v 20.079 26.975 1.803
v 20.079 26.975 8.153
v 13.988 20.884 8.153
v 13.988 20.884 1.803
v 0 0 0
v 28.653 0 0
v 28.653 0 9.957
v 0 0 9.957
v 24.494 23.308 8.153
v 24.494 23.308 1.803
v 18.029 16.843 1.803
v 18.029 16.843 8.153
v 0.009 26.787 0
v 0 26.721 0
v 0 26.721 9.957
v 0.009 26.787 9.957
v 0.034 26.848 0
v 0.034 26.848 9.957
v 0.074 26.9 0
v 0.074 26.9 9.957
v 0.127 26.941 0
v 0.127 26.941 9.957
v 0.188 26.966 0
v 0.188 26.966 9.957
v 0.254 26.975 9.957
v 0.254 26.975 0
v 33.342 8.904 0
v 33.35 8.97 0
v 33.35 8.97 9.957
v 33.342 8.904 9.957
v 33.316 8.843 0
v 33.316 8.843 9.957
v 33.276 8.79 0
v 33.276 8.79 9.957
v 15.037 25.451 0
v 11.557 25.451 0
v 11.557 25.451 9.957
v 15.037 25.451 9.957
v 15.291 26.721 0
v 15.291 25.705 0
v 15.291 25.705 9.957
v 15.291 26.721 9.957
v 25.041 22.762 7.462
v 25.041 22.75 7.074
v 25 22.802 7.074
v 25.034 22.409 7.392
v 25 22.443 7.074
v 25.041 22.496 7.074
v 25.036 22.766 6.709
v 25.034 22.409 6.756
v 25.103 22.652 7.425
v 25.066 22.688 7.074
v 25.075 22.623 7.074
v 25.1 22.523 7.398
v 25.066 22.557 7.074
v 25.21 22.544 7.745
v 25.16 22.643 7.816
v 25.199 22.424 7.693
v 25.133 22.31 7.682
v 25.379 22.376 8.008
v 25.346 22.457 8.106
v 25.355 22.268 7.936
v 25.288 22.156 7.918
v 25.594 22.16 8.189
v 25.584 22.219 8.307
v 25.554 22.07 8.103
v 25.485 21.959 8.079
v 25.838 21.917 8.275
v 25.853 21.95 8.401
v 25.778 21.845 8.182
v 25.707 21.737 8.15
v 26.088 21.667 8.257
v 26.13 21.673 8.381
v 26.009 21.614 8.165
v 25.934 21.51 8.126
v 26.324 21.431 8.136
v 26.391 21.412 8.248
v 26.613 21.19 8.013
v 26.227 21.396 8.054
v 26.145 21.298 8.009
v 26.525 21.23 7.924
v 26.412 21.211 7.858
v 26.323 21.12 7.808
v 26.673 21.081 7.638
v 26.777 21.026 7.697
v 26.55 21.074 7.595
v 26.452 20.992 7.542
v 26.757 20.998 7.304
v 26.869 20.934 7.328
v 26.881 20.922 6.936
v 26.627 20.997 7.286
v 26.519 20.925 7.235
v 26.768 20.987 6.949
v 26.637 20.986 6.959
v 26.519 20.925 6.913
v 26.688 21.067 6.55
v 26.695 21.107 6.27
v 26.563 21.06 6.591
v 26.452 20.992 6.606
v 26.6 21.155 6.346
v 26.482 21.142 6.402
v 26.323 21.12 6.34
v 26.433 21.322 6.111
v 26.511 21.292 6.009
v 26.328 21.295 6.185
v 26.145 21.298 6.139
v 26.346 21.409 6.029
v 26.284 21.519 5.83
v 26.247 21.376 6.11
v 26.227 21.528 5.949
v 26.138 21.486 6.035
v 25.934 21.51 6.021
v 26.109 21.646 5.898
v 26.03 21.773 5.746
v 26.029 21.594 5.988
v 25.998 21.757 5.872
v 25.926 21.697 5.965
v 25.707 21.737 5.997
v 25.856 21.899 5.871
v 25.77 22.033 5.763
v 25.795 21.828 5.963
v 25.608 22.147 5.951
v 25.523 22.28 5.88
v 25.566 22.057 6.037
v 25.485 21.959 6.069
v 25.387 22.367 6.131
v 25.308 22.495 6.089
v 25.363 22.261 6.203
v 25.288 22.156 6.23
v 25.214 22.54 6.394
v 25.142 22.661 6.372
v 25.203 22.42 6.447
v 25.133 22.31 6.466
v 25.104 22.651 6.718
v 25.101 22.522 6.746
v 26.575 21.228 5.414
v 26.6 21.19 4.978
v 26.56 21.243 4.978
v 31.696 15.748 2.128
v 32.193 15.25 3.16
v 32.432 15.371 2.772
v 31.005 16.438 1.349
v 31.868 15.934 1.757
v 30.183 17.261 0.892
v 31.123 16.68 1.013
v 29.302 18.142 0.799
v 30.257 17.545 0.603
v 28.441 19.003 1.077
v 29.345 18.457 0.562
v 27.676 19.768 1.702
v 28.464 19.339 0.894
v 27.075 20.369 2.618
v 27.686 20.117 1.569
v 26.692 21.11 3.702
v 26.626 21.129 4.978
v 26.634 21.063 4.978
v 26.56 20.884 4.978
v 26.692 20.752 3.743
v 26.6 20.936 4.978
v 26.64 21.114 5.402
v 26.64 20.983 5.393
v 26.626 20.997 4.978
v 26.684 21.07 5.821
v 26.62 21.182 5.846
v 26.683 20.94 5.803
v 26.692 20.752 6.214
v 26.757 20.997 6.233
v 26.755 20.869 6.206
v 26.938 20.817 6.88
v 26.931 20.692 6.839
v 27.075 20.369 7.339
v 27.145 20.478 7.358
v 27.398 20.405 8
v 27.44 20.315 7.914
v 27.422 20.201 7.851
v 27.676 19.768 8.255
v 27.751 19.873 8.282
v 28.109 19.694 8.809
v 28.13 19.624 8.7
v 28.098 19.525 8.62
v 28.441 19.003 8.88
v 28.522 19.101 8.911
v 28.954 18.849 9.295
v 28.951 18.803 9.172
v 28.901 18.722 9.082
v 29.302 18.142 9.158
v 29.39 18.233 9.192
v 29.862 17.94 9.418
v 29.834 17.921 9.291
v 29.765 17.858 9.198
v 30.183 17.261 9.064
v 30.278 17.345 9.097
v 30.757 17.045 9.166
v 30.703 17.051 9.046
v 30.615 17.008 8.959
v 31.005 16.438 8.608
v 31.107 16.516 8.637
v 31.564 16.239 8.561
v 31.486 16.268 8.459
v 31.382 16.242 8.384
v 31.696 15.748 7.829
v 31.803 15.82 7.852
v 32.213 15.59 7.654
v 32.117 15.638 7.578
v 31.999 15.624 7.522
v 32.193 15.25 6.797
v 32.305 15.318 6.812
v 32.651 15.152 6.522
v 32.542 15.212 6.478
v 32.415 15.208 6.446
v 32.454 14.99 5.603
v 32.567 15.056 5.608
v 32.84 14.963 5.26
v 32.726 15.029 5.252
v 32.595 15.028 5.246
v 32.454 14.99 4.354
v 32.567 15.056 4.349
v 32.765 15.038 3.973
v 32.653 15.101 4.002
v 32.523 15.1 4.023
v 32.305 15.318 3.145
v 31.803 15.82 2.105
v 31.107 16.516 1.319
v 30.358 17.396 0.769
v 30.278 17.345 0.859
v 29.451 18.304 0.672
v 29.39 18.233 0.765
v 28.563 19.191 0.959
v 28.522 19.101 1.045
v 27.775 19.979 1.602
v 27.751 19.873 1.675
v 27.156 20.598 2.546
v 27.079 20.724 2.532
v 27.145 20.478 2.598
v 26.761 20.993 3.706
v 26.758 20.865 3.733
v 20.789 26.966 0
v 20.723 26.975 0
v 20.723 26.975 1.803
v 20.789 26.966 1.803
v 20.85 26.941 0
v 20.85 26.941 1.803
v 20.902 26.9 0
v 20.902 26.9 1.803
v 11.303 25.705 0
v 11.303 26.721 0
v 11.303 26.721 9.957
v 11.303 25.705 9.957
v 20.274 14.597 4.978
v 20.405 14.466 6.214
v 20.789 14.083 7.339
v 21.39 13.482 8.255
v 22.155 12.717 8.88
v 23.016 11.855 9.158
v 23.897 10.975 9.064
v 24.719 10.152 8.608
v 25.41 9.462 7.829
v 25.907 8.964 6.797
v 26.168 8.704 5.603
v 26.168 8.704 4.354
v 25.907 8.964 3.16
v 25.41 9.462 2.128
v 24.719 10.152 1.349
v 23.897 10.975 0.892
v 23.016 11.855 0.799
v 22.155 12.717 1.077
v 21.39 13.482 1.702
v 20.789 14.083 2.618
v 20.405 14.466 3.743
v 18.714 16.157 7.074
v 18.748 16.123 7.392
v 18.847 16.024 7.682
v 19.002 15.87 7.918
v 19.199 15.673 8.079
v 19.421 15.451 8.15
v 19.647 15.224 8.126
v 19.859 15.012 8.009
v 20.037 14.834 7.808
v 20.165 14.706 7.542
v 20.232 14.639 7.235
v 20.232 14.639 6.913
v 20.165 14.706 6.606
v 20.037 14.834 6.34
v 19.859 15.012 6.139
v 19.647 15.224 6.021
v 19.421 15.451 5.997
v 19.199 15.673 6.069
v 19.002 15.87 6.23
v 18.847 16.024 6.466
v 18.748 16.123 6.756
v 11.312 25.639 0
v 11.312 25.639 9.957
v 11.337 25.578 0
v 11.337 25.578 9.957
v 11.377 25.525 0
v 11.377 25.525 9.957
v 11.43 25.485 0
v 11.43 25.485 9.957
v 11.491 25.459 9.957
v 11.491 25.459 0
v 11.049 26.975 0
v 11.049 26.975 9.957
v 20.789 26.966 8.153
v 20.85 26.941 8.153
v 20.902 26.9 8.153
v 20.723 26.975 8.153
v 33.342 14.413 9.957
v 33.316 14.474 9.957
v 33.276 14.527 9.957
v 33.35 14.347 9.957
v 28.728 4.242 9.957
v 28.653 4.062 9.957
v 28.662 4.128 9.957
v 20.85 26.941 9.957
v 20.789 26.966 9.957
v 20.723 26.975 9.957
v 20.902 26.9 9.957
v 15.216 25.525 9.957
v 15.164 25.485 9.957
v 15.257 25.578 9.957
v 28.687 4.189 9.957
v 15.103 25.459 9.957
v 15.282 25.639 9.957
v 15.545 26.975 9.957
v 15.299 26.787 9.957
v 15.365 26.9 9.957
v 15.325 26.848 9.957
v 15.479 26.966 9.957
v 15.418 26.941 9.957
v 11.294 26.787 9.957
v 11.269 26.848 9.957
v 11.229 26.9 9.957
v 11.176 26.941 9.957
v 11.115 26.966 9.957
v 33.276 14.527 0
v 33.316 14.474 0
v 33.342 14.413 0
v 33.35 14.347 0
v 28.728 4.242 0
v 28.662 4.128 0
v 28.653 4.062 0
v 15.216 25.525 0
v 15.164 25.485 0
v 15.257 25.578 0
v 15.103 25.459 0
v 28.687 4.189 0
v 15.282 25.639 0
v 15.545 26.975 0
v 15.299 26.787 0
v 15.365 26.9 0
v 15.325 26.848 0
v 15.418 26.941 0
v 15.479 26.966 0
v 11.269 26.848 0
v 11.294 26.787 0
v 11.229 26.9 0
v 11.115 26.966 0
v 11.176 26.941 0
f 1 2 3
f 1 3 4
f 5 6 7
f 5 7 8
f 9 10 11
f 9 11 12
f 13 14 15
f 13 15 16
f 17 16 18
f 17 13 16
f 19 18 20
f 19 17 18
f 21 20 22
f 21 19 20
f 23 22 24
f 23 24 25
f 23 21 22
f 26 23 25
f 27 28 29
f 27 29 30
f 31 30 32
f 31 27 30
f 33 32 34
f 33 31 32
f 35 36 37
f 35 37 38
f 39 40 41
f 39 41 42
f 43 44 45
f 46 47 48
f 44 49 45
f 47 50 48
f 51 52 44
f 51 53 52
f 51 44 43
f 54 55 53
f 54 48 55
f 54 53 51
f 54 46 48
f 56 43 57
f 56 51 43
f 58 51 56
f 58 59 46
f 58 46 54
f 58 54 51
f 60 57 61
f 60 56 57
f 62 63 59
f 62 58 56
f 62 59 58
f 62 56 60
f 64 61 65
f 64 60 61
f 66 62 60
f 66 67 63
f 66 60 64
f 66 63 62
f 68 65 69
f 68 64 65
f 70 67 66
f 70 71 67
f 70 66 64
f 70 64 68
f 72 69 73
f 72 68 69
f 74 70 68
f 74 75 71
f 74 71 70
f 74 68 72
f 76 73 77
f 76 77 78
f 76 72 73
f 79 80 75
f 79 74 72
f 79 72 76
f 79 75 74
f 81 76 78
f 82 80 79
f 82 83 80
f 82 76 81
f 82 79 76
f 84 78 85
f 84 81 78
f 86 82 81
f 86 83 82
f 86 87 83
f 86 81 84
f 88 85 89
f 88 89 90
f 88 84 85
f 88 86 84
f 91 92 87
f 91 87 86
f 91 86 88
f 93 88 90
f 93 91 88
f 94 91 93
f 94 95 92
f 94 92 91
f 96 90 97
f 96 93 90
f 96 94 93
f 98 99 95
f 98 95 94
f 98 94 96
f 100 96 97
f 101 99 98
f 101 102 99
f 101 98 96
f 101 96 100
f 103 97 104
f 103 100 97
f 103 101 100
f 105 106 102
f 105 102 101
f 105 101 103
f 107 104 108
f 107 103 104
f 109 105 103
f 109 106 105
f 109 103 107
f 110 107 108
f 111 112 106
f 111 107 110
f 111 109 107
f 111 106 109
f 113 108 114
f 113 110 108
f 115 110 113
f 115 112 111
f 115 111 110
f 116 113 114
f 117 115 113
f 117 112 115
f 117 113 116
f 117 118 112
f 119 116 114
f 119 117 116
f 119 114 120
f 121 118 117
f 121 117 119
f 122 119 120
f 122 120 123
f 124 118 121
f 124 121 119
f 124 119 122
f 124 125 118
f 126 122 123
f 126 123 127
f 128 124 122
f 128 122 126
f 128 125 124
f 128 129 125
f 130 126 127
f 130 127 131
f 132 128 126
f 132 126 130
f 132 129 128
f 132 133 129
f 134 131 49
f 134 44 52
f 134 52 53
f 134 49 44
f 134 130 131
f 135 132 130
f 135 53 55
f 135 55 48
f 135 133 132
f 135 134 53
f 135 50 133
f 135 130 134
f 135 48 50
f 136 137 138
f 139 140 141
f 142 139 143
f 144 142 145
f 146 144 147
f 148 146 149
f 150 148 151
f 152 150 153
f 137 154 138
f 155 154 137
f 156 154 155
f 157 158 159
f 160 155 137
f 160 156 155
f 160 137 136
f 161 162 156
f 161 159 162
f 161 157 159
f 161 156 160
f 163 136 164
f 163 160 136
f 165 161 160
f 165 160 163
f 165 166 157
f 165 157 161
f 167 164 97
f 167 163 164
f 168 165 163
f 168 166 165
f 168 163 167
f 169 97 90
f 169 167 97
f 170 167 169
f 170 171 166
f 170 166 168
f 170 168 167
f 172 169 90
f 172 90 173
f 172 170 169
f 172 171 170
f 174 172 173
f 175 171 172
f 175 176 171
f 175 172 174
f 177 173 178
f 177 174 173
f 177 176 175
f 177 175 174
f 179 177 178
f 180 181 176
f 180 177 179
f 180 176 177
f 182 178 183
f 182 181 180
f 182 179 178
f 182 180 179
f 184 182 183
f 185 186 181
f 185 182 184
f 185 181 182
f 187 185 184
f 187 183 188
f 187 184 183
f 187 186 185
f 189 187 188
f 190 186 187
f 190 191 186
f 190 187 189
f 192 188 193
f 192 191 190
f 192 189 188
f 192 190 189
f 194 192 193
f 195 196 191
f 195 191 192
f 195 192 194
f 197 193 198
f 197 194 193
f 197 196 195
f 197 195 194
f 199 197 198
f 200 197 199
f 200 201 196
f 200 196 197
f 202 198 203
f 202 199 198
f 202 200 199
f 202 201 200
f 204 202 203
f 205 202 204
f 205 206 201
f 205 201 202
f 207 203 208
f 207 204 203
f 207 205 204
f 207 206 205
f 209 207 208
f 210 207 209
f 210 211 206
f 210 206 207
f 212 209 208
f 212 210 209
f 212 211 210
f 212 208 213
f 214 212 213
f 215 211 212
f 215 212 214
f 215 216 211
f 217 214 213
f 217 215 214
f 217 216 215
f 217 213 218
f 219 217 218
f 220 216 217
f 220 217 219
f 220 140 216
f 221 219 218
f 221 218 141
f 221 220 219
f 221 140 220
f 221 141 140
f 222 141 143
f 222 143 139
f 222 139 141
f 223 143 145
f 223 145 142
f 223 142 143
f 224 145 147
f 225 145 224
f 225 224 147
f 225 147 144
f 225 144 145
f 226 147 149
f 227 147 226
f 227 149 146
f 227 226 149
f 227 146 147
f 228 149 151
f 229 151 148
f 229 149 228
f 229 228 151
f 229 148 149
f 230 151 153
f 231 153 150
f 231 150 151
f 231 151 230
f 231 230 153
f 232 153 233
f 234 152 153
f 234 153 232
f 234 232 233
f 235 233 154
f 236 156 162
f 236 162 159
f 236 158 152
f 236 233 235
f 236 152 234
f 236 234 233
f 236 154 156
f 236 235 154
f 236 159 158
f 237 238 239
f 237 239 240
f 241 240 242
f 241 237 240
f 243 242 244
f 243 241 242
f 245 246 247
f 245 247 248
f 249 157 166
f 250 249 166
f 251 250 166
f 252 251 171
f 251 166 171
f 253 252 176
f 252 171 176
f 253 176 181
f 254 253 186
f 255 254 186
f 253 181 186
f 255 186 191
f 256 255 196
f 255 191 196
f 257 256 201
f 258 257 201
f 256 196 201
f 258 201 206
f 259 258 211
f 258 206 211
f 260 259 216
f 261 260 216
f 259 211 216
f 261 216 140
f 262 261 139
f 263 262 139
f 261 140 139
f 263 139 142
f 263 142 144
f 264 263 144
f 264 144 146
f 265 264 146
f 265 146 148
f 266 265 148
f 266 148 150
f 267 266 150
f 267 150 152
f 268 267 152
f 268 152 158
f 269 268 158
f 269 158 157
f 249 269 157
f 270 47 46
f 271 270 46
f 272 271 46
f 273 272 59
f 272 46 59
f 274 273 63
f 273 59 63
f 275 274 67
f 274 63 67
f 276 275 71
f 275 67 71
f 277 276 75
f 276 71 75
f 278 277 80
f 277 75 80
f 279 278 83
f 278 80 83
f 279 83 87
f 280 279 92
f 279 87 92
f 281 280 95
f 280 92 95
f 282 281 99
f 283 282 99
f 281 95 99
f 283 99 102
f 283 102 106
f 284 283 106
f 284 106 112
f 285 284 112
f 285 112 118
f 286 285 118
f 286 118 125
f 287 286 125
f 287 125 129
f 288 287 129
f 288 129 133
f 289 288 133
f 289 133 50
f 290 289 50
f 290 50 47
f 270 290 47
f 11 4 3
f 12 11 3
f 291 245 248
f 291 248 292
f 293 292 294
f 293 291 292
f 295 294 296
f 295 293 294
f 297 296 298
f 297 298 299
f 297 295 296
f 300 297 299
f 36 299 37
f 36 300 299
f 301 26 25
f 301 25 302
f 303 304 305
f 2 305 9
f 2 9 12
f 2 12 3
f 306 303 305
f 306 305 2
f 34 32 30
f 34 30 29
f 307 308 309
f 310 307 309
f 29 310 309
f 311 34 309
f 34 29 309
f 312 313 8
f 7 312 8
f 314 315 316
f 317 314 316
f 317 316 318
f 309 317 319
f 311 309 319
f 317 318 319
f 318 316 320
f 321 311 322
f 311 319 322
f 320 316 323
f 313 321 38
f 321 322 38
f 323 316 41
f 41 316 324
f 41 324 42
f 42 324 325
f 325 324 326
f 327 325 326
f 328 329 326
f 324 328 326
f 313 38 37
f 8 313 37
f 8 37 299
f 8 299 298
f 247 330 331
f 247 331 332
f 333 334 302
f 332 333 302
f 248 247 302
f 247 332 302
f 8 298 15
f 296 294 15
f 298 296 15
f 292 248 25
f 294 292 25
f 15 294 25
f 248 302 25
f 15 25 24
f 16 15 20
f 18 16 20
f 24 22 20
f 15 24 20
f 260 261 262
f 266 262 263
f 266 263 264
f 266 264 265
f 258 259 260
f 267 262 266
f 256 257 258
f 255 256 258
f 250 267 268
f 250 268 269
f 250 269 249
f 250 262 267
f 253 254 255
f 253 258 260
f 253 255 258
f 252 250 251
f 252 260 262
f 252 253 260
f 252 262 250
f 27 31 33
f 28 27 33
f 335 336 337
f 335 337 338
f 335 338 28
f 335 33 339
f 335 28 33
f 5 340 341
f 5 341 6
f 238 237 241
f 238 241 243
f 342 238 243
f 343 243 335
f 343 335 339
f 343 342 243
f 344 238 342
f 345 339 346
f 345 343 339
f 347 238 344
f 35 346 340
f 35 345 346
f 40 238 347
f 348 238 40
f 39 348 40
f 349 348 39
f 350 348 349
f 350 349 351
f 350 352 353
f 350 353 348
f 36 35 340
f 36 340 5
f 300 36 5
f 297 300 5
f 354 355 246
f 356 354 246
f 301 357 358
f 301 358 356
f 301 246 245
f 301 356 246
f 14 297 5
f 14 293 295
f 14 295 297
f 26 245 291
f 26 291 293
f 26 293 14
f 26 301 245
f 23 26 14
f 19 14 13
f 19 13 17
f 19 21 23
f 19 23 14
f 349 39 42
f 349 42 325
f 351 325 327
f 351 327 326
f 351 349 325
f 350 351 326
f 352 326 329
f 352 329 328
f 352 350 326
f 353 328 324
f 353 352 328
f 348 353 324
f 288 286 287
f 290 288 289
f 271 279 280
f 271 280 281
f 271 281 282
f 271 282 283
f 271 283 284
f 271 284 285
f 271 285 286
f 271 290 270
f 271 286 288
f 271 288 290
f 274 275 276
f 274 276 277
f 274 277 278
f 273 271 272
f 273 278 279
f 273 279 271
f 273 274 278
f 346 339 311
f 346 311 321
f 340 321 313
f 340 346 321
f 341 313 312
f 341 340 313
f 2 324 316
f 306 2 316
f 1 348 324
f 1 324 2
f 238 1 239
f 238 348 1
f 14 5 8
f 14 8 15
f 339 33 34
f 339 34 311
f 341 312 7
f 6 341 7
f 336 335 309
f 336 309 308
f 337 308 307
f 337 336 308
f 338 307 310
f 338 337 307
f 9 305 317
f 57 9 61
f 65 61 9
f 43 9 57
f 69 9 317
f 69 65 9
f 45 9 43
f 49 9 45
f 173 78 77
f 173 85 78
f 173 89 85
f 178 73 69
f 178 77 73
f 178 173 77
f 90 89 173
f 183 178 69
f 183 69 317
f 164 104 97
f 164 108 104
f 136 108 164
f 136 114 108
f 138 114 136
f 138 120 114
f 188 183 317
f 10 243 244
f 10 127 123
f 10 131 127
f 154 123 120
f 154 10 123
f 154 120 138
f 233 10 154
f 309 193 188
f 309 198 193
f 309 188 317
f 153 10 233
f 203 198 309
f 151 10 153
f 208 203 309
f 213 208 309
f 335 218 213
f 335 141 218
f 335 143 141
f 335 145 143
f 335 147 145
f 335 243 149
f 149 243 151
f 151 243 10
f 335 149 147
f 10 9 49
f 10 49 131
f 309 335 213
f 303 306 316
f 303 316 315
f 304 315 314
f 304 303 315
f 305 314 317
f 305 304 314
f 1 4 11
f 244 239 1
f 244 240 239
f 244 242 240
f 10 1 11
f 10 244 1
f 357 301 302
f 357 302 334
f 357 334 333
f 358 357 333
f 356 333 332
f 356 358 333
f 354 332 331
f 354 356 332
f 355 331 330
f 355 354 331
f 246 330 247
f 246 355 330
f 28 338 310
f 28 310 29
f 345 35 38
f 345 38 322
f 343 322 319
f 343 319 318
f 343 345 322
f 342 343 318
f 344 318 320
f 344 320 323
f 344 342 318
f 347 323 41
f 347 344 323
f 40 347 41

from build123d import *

# Parameters (mm, degrees)
EXTRUDE1_DEPTH = 9.9568
SKETCH2_R      = 4.191000000000001
SKETCH2_R_2    = 1.079499999999997
EXTRUDE2_DEPTH = 9.144
FILLET1_R      = 0.254


with BuildPart() as part:
    # Sketch1 → Extrude1 (new body)
    with BuildSketch(Plane.XY):
        with BuildLine():
            Line((0, 0), (0, 26.720799999999993))
            ThreePointArc((0, 26.720799999999993), (0.07439487757861757, 26.900405122421375), (0.2540000000000018, 26.974799999999995))
            Line((0.2540000000000018, 26.974799999999995), (11.048999999999998, 26.9748))
            ThreePointArc((11.048999999999998, 26.9748), (11.228605122421383, 26.900405122421382), (11.303, 26.720799999999997))
            Line((11.303, 26.720799999999997), (11.303, 25.704799999999995))
            ThreePointArc((11.303, 25.704799999999995), (11.377394877578618, 25.52519487757861), (11.557000000000002, 25.450799999999994))
            Line((11.557000000000002, 25.450799999999994), (15.036799999999998, 25.450799999999994))
            ThreePointArc((15.036799999999998, 25.450799999999994), (15.216405122421383, 25.52519487757861), (15.2908, 25.704799999999995))
            Line((15.2908, 25.704799999999995), (15.2908, 26.720799999999997))
            ThreePointArc((15.2908, 26.720799999999997), (15.365194877578617, 26.900405122421382), (15.5448, 26.9748))
            Line((15.5448, 26.9748), (20.72278975515723, 26.974800000000002))
            ThreePointArc((20.72278975515723, 26.974800000000002), (20.819991346977968, 26.955465401257868), (20.902394877578615, 26.90040512242138))
            Line((20.902394877578615, 26.90040512242138), (33.275805122421374, 14.52699487757856))
            ThreePointArc((33.275805122421374, 14.52699487757856), (33.33086540125785, 14.444591346977912), (33.350199999999994, 14.347389755157183))
            Line((33.350199999999994, 14.347389755157183), (33.35019999999999, 8.969810244842721))
            ThreePointArc((33.35019999999999, 8.969810244842721), (33.33086540125785, 8.872608653021988), (33.275805122421374, 8.790205122421336))
            Line((33.275805122421374, 8.790205122421336), (28.72762045926646, 4.242020459266578))
            ThreePointArc((28.72762045926646, 4.242020459266578), (28.67256018042997, 4.159616928665926), (28.653225581687842, 4.0624153368451905))
            Line((28.653225581687842, 4.0624153368451905), (28.653225581687938, 4.34e-15))
            Line((28.653225581687938, 4.34e-15), (0, 0))
        make_face()
    extrude(amount=EXTRUDE1_DEPTH)

    # Sketch2 → Extrude2 (cut)
    with BuildSketch(Plane(origin=(23.90140000000005, 23.90139999999994, 0), x_dir=(0, 0, -1), z_dir=(0.7071067811865491, 0.707106781186546, 0))):
        with Locations(Location((-4.978399999999999, -8.204766282245217, 0), (0, 0, 90))):
            Circle(SKETCH2_R)
        with Locations(Location((-7.073900000000001, -2.887802416466178, 0), (0, 0, 90))):
            Circle(SKETCH2_R_2)
        Polygon((-8.153400000000001, 4.876233717754782), (-1.8034000000000028, 4.876233717754782), (-1.803400000000002, -0.838766282245218), (-8.153400000000001, -0.838766282245218), align=None)
    extrude(amount=-EXTRUDE2_DEPTH, mode=Mode.SUBTRACT)

    # Fillet1
    # the kernel refuses this fillet: 0.254 mm, written as the material it takes off along each edge
    with BuildSketch(Plane(origin=(29.70304587622637, 18.099754123773593, 4.978399999999999), x_dir=(-0.7071067811865458, 0.7071067811865491, 0), z_dir=(0, 0, -1))) as fillet1_piece_1:
        with BuildLine():
            CenterArc((4.191000000000001 + FILLET1_R, -FILLET1_R), FILLET1_R, 89.99999999999982, 89.9999999999984)
            Line((4.190999999999995, -FILLET1_R), (4.191000000000001, 1e-16))
            Line((4.191000000000001, 1e-16), (4.191000000000001 + FILLET1_R, -8.03e-15))
        make_face()
    revolve(axis=Axis((29.70304587622637, 18.099754123773593, 4.978399999999999), (0.7071067811865491, 0.707106781186546, 0)), mode=Mode.SUBTRACT)
    with BuildSketch(Plane(origin=(25.94338467141018, 21.8594153285898, 7.073900000000001), x_dir=(-0.7071067811865476, 0.7071067811865476, 0), z_dir=(0, 0, -1.0000000000000002))) as fillet1_piece_2:
        with BuildLine():
            CenterArc((1.079499999999997 + FILLET1_R, -FILLET1_R), FILLET1_R, 90, 89.99999999999832)
            Line((1.0794999999999895, -FILLET1_R), (1.079499999999997, -3e-17))
            Line((1.079499999999997, -3e-17), (1.079499999999997 + FILLET1_R, -5.05e-15))
        make_face()
    revolve(axis=Axis((25.94338467141018, 21.8594153285898, 7.073900000000001), (0.7071067811865491, 0.707106781186546, 0)), mode=Mode.SUBTRACT)


solid = part.part
